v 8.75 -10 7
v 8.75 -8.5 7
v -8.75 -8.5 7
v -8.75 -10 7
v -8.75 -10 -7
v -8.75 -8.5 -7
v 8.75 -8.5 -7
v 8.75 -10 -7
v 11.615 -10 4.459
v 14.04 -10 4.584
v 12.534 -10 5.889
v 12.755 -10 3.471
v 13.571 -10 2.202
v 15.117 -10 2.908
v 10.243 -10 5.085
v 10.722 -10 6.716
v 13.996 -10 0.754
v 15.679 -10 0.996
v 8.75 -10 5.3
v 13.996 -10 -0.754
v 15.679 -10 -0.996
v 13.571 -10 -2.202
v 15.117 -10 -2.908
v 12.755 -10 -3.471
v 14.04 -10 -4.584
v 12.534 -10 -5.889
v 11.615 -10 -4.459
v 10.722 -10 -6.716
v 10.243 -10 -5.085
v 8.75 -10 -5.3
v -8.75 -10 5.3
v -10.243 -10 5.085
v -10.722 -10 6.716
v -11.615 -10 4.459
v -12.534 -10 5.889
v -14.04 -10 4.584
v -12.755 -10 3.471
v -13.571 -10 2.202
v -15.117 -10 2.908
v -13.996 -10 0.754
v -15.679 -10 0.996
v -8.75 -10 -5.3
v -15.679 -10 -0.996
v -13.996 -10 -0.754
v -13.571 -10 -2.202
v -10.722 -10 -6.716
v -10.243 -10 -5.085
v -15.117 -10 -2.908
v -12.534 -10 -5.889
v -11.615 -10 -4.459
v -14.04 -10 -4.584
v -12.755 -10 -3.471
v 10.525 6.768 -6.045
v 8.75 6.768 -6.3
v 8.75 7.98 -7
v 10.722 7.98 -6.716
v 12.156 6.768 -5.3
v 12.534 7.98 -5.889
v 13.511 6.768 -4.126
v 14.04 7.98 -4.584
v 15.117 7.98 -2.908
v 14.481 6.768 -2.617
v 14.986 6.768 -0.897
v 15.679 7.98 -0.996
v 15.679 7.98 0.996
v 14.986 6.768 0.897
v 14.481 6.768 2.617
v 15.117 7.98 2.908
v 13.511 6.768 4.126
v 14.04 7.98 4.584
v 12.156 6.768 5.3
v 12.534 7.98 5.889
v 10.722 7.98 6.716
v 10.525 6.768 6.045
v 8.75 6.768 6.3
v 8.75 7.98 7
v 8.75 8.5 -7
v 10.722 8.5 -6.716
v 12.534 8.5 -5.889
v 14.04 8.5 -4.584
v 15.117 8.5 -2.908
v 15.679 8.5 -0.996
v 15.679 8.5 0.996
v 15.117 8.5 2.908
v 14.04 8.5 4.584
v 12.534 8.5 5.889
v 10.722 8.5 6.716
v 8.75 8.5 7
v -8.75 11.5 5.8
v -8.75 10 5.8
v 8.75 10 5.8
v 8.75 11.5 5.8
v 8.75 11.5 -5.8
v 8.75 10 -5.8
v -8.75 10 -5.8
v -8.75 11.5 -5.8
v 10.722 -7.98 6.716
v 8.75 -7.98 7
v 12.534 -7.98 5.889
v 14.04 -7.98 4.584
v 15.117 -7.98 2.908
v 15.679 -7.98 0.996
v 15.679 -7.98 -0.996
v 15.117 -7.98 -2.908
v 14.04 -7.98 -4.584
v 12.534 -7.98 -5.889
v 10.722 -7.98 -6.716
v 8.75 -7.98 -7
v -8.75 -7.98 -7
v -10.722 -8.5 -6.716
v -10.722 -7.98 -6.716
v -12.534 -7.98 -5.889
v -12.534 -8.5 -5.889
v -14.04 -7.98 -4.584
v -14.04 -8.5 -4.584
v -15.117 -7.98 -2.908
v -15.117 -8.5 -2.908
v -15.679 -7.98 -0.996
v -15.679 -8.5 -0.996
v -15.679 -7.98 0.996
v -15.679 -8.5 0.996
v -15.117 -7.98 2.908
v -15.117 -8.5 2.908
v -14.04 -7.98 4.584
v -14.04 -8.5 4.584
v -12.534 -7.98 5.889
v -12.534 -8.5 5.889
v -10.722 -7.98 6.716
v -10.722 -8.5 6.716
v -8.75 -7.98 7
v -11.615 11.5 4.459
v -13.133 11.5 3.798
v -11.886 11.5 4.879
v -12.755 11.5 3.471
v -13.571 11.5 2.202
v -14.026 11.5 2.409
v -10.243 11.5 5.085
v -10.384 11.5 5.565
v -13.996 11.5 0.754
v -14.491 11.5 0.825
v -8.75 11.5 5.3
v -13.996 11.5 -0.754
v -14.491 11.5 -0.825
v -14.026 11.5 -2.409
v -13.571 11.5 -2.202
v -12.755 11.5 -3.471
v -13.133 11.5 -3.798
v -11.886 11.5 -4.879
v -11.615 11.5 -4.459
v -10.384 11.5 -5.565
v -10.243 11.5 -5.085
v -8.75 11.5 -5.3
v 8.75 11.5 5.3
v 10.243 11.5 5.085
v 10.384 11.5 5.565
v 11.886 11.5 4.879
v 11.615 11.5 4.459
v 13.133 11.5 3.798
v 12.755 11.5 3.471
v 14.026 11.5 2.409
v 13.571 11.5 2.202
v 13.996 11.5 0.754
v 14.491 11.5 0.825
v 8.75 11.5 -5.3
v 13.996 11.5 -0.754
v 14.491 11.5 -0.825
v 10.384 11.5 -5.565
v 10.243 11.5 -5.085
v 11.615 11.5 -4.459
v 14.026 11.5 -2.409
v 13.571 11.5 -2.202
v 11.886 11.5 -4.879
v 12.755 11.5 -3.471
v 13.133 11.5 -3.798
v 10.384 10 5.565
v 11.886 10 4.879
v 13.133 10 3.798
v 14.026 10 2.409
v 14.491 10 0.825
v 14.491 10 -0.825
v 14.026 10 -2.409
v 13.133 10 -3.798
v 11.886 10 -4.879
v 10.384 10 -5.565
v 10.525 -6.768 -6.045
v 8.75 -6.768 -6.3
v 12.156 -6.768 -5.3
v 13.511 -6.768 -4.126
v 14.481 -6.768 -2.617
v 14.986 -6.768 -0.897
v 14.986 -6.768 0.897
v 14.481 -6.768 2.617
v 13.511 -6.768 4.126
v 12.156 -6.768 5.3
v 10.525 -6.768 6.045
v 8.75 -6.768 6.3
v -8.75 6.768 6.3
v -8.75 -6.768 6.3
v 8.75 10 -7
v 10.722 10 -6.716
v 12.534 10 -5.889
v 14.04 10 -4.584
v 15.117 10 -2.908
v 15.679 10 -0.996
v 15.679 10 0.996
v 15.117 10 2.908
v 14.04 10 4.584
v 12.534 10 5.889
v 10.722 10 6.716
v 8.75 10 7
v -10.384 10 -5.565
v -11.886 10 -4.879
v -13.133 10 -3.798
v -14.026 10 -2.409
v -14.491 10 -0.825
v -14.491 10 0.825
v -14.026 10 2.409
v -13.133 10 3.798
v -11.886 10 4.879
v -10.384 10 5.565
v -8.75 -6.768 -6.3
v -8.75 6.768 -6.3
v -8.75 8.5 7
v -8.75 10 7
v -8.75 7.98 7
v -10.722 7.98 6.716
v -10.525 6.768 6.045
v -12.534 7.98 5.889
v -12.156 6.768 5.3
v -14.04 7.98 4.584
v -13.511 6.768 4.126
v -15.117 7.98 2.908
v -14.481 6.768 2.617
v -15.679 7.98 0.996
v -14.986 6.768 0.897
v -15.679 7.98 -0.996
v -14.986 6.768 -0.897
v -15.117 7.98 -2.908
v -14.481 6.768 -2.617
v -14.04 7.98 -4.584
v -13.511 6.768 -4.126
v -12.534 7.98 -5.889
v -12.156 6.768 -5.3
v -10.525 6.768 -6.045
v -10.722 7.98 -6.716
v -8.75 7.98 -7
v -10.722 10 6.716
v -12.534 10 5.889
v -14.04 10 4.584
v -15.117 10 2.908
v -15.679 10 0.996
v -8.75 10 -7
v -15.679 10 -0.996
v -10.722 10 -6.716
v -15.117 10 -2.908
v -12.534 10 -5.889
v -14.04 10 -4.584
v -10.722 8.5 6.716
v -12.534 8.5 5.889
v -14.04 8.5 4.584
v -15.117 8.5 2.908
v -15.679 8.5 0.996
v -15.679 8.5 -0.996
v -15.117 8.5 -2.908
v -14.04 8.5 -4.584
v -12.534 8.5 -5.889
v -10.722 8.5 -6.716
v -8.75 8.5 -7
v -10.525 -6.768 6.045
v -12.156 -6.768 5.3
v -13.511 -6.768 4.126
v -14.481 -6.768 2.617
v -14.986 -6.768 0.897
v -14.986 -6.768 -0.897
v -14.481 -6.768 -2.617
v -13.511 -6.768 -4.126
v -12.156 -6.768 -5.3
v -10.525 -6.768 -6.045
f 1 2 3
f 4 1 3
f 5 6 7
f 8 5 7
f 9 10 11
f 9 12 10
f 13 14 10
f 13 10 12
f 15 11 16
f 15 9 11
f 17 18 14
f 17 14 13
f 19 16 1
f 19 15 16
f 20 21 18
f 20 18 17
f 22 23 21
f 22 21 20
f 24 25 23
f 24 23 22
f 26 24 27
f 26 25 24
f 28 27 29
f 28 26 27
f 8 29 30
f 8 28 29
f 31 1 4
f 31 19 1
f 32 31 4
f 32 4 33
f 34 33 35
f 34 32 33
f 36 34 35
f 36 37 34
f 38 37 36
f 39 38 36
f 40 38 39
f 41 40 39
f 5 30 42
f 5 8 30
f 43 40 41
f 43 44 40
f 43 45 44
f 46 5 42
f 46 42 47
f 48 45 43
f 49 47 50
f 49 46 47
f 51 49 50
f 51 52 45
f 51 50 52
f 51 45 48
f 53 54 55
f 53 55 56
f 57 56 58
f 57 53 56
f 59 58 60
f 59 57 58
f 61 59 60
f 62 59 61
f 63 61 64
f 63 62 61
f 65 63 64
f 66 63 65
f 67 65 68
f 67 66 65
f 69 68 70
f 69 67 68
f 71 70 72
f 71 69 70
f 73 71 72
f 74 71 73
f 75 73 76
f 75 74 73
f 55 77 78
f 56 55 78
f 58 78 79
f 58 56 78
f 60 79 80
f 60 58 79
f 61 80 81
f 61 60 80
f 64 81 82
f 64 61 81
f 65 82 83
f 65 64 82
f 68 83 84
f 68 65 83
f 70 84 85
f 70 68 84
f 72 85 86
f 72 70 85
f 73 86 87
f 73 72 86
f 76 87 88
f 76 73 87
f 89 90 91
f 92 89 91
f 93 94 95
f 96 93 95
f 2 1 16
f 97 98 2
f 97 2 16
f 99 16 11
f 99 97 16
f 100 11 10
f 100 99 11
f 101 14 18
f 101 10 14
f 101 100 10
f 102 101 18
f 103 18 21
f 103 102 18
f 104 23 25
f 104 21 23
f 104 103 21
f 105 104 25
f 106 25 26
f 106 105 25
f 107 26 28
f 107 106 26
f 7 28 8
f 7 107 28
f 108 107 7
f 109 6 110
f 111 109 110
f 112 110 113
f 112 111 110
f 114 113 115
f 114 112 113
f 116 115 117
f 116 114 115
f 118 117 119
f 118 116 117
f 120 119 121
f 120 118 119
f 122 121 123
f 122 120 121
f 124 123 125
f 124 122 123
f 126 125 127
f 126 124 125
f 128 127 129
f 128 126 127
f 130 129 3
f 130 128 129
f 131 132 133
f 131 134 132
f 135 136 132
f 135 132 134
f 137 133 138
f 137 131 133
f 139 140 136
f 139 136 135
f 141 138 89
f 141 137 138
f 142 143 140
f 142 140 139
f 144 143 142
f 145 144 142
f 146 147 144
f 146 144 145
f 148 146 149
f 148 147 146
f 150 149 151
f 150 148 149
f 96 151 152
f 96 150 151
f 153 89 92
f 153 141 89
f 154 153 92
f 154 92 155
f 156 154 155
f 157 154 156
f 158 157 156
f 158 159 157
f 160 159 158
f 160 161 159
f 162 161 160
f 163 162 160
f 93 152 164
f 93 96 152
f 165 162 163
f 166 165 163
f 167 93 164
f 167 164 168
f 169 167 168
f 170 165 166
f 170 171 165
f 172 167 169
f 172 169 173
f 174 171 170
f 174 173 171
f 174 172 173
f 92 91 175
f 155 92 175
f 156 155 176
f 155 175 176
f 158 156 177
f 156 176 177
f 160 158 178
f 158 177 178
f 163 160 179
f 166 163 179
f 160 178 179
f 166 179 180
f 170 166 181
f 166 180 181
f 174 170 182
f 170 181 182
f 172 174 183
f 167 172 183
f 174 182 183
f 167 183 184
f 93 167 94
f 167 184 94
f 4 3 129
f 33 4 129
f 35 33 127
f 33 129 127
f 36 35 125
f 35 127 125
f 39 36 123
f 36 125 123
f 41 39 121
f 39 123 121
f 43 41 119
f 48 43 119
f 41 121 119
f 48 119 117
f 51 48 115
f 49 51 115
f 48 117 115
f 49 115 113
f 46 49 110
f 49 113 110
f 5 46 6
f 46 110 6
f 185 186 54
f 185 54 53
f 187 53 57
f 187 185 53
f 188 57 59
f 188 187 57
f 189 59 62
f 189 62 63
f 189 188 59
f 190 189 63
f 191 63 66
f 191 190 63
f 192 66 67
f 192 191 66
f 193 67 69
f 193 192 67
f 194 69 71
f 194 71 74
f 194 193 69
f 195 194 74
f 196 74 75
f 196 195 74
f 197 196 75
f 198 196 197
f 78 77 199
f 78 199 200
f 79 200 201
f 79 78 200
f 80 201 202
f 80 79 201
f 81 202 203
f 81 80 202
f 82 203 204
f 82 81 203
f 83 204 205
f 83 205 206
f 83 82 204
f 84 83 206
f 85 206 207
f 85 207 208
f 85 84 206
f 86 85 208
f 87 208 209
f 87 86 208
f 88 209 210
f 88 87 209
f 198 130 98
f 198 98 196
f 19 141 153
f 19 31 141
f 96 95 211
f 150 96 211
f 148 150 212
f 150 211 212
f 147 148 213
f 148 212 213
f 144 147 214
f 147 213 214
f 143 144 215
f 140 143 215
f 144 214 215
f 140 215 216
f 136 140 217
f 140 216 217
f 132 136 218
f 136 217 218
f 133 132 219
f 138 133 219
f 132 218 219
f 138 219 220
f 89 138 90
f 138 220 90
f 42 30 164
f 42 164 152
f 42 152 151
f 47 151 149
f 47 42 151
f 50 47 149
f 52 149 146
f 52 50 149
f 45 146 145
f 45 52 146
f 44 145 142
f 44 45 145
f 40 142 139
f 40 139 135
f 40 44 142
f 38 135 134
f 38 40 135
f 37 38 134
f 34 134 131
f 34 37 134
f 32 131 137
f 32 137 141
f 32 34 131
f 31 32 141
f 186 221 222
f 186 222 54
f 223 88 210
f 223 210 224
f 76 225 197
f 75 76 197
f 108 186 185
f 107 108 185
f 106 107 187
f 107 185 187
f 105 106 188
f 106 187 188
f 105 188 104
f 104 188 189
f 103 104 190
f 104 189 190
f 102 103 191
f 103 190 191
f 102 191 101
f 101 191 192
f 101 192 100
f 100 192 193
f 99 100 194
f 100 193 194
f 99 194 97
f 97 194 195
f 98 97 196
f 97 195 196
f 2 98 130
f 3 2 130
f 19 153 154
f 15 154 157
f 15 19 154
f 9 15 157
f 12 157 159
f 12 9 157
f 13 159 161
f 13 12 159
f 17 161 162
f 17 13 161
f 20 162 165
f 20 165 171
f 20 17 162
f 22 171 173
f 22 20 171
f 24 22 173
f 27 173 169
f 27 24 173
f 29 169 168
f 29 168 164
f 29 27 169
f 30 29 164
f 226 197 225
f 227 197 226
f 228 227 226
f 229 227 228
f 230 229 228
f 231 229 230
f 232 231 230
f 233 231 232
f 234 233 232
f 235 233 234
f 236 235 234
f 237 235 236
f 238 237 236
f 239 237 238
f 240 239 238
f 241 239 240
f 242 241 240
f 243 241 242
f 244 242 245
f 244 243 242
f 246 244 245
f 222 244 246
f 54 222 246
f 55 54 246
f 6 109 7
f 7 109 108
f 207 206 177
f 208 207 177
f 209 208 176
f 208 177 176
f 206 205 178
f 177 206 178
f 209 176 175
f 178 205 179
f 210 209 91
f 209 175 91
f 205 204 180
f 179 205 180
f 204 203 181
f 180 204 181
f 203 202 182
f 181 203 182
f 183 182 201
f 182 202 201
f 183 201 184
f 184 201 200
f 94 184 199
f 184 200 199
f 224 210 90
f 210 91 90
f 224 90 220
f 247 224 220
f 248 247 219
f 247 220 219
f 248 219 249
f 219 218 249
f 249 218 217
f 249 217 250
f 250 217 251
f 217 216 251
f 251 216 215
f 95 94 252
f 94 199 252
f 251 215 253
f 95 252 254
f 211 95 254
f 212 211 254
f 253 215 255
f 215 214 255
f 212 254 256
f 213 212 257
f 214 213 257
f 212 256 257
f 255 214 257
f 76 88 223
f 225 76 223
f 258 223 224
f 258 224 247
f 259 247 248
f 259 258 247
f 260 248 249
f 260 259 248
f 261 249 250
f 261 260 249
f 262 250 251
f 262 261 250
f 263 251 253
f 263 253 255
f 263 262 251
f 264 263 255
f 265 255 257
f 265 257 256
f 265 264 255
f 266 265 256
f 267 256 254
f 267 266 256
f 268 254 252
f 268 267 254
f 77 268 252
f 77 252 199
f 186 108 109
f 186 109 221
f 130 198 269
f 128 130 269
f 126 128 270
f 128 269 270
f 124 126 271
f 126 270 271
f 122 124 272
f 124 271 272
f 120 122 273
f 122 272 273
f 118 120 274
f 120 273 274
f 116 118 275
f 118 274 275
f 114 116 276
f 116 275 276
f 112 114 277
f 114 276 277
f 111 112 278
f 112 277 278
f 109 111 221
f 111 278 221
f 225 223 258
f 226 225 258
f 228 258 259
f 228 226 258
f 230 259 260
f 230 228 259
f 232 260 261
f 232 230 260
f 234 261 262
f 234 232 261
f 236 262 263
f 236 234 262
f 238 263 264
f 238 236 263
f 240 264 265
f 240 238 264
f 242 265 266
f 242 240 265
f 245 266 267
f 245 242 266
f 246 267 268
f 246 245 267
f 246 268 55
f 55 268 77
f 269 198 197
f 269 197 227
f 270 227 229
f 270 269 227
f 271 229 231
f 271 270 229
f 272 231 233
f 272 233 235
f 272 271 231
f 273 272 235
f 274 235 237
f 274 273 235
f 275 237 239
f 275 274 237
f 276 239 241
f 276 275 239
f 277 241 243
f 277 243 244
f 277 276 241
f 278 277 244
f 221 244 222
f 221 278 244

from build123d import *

# Parameters (mm, degrees)
BOSS_EXTRUDE1_DEPTH      = 10
BOSS_EXTRUDE1_DEPTH_BACK = 10
BOSS_EXTRUDE2_START      = -1.5
BOSS_EXTRUDE2_DEPTH      = 1.5
BOSS_EXTRUDE3_DEPTH      = 1.5
CHAMFER1_SIZE            = 1
CHAMFER1_SIZE_2          = 1.732050808


with BuildPart() as part:
    # Sketch1 → Boss-Extrude1 (new, two sides: drawn at the far end of the back side and taken through both)
    with BuildSketch(Plane(origin=(0, 0, 0), x_dir=(1, 0, 0), z_dir=(0, 1, 0)).offset(-BOSS_EXTRUDE1_DEPTH_BACK)):
        with BuildLine():
            Line((-8.75, 6.3), (8.75, 6.3))
            ThreePointArc((8.75, 6.3), (15.05, 0), (8.75, -6.3))
            Line((8.75, -6.3), (-8.75, -6.3))
            ThreePointArc((-8.75, -6.3), (-15.05, 0), (-8.75, 6.3))
        make_face()
        with BuildLine():
            Line((-8.75, 5.3), (8.75, 5.3))
            ThreePointArc((8.75, 5.3), (14.05, 0), (8.75, -5.3))
            Line((8.75, -5.3), (-8.75, -5.3))
            ThreePointArc((-8.75, -5.3), (-14.05, 0), (-8.75, 5.3))
        make_face(mode=Mode.SUBTRACT)
    extrude(amount=BOSS_EXTRUDE1_DEPTH + BOSS_EXTRUDE1_DEPTH_BACK)

    # Sketch2 → Boss-Extrude2 (add)
    with BuildSketch(Plane(origin=(0, 10, 0), x_dir=(1, 0, 0), z_dir=(0, 1, 0)).offset(BOSS_EXTRUDE2_START)):
        with BuildLine():
            Line((8.75, -7), (-8.75, -7))
            ThreePointArc((-8.75, -7), (-15.75, 0), (-8.75, 7))
            Line((-8.75, 7), (8.75, 7))
            ThreePointArc((8.75, 7), (15.75, 0), (8.75, -7))
        make_face()
        with BuildLine():
            Line((-8.75, -5.3), (8.75, -5.3))
            ThreePointArc((8.75, -5.3), (14.05, 0), (8.75, 5.3))
            Line((8.75, 5.3), (-8.75, 5.3))
            ThreePointArc((-8.75, 5.3), (-14.05, 0), (-8.75, -5.3))
        make_face(mode=Mode.SUBTRACT)
    boss_extrude2 = extrude(amount=BOSS_EXTRUDE2_DEPTH)

    # Mirror1: Boss-Extrude2 across plane
    add(boss_extrude2.mirror(Plane.ZX))

    # Sketch3 → Boss-Extrude3 (add)
    with BuildSketch(Plane(origin=(0, 10, 0), x_dir=(1, 0, 0), z_dir=(0, 1, 0))):
        with BuildLine():
            Line((-8.75, -5.8), (8.75, -5.8))
            ThreePointArc((8.75, -5.8), (14.55, 0), (8.75, 5.8))
            Line((8.75, 5.8), (-8.75, 5.8))
            ThreePointArc((-8.75, 5.8), (-14.55, 0), (-8.75, -5.8))
        make_face()
        with BuildLine():
            Line((-8.75, -5.3), (8.75, -5.3))
            ThreePointArc((8.75, -5.3), (14.05, 0), (8.75, 5.3))
            Line((8.75, 5.3), (-8.75, 5.3))
            ThreePointArc((-8.75, 5.3), (-14.05, 0), (-8.75, -5.3))
        make_face(mode=Mode.SUBTRACT)
    extrude(amount=BOSS_EXTRUDE3_DEPTH)

    # Chamfer1
    # the kernel refuses this chamfer: 1.732050808, 1 mm, written as the material it adds along each edge
    with BuildSketch(Plane(origin=(8.75, -8.5, 0), x_dir=(0, 0, -1), z_dir=(-1, 0, 0))) as chamfer1_piece_1_section:
        Polygon((6.3 + CHAMFER1_SIZE, 0), (6.3, -CHAMFER1_SIZE_2), (6.3, 0), align=None)
    chamfer1_piece_1 = revolve(axis=Axis((8.75, -8.5, 0), (0, -1, 0)), revolution_arc=180, mode=Mode.PRIVATE)
    chamfer1_piece_1 = chamfer1_piece_1 & Plane(origin=(8.75, -7.628425911, 0), x_dir=(0, 0, -1), z_dir=(0, 1, 0)) * Cylinder(7, 30, mode=Mode.PRIVATE)
    add(chamfer1_piece_1)
    with BuildSketch(Plane(origin=(8.75, -8.5, -6.3), x_dir=(0, -0.05789386240267147, -0.9983227437537926), z_dir=(-1, 0, 0))) as chamfer1_piece_2_section:
        Polygon((CHAMFER1_SIZE * 0.998322743754, -CHAMFER1_SIZE * 0.0578938624027), (-CHAMFER1_SIZE_2 * 0.0578938623883, -CHAMFER1_SIZE_2 * 0.998322743505), (0, 0), align=None)
    chamfer1_piece_2 = extrude(amount=17.5, mode=Mode.PRIVATE)
    chamfer1_piece_2 = split(chamfer1_piece_2, bisect_by=Plane(origin=(1.34e-07, -7.886810156, -7), z_dir=(0, 0, 1)), keep=Keep.TOP, mode=Mode.PRIVATE)
    add(chamfer1_piece_2)
    with BuildSketch(Plane(origin=(-8.75, -8.5, 6.3), x_dir=(0, -0.05789386240267147, 0.9983227437537926), z_dir=(1, 0, 0))) as chamfer1_piece_3_section:
        Polygon((CHAMFER1_SIZE * 0.998322743754, -CHAMFER1_SIZE * 0.0578938624027), (-CHAMFER1_SIZE_2 * 0.0578938623883, -CHAMFER1_SIZE_2 * 0.998322743505), (0, 0), align=None)
    chamfer1_piece_3 = extrude(amount=17.5, mode=Mode.PRIVATE)
    chamfer1_piece_3 = split(chamfer1_piece_3, bisect_by=Plane(origin=(-1.34e-07, -7.886810156, 7), z_dir=(0, 0, -1)), keep=Keep.TOP, mode=Mode.PRIVATE)
    add(chamfer1_piece_3)
    with BuildSketch(Plane(origin=(-8.75, -8.5, 0), x_dir=(0, 0, 1), z_dir=(1, 0, 0))) as chamfer1_piece_4_section:
        Polygon((6.3 + CHAMFER1_SIZE, 0), (6.3, -CHAMFER1_SIZE_2), (6.3, 0), align=None)
    chamfer1_piece_4 = revolve(axis=Axis((-8.75, -8.5, 0), (0, -1, 0)), revolution_arc=180, mode=Mode.PRIVATE)
    chamfer1_piece_4 = chamfer1_piece_4 & Plane(origin=(-8.75, -7.628425911, 0), x_dir=(0, 0, 1), z_dir=(0, 1, 0)) * Cylinder(7, 30, mode=Mode.PRIVATE)
    add(chamfer1_piece_4)
    with BuildSketch(Plane(origin=(8.75, 8.5, -6.3), x_dir=(0, -0.9998132206222079, 0.01932676561270069), z_dir=(-1, 0, 0))) as chamfer1_piece_5_section:
        Polygon((CHAMFER1_SIZE_2 * 0.999813220373, -CHAMFER1_SIZE_2 * 0.0193267656079), (-CHAMFER1_SIZE * 0.0193267656127, -CHAMFER1_SIZE * 0.999813220622), (0, 0), align=None)
    chamfer1_piece_5 = extrude(amount=17.5, mode=Mode.PRIVATE)
    chamfer1_piece_5 = split(chamfer1_piece_5, bisect_by=Plane(origin=(7.49146337, 7.814472044, -7), z_dir=(0, 0, 1)), keep=Keep.TOP, mode=Mode.PRIVATE)
    add(chamfer1_piece_5)
    with BuildSketch(Plane(origin=(8.75, 8.5, 0), x_dir=(0, 0, -1), z_dir=(-1, 0, 0))) as chamfer1_piece_6_section:
        Polygon((6.3 + CHAMFER1_SIZE, 0), (6.3, CHAMFER1_SIZE_2), (6.3, 0), align=None)
    chamfer1_piece_6 = revolve(axis=Axis((8.75, 8.5, 0), (0, -1, 0)), revolution_arc=180, mode=Mode.PRIVATE)
    chamfer1_piece_6 = chamfer1_piece_6 & Plane(origin=(8.75, 7.628425911, 0), x_dir=(0, 0, -1), z_dir=(0, -1, 0)) * Cylinder(7, 30, mode=Mode.PRIVATE)
    add(chamfer1_piece_6)
    with BuildSketch(Plane(origin=(-8.75, 8.5, 0), x_dir=(0, 0, 1), z_dir=(1, 0, 0))) as chamfer1_piece_7_section:
        Polygon((6.3 + CHAMFER1_SIZE, 0), (6.3, CHAMFER1_SIZE_2), (6.3, 0), align=None)
    chamfer1_piece_7 = revolve(axis=Axis((-8.75, 8.5, 0), (0, -1, 0)), revolution_arc=180, mode=Mode.PRIVATE)
    chamfer1_piece_7 = chamfer1_piece_7 & Plane(origin=(-8.75, 7.628425911, 0), x_dir=(0, 0, 1), z_dir=(0, -1, 0)) * Cylinder(7, 30, mode=Mode.PRIVATE)
    add(chamfer1_piece_7)
    with BuildSketch(Plane(origin=(-8.75, 8.5, 6.3), x_dir=(0, 0.05789386240267147, 0.9983227437537926), z_dir=(1, 0, 0))) as chamfer1_piece_8_section:
        Polygon((CHAMFER1_SIZE * 0.998322743754, CHAMFER1_SIZE * 0.0578938624027), (-CHAMFER1_SIZE_2 * 0.0578938623883, CHAMFER1_SIZE_2 * 0.998322743505), (0, 0), align=None)
    chamfer1_piece_8 = extrude(amount=17.5, mode=Mode.PRIVATE)
    chamfer1_piece_8 = split(chamfer1_piece_8, bisect_by=Plane(origin=(-1.34e-07, 7.886810156, 7), z_dir=(0, 0, -1)), keep=Keep.TOP, mode=Mode.PRIVATE)
    add(chamfer1_piece_8)


solid = part.part
